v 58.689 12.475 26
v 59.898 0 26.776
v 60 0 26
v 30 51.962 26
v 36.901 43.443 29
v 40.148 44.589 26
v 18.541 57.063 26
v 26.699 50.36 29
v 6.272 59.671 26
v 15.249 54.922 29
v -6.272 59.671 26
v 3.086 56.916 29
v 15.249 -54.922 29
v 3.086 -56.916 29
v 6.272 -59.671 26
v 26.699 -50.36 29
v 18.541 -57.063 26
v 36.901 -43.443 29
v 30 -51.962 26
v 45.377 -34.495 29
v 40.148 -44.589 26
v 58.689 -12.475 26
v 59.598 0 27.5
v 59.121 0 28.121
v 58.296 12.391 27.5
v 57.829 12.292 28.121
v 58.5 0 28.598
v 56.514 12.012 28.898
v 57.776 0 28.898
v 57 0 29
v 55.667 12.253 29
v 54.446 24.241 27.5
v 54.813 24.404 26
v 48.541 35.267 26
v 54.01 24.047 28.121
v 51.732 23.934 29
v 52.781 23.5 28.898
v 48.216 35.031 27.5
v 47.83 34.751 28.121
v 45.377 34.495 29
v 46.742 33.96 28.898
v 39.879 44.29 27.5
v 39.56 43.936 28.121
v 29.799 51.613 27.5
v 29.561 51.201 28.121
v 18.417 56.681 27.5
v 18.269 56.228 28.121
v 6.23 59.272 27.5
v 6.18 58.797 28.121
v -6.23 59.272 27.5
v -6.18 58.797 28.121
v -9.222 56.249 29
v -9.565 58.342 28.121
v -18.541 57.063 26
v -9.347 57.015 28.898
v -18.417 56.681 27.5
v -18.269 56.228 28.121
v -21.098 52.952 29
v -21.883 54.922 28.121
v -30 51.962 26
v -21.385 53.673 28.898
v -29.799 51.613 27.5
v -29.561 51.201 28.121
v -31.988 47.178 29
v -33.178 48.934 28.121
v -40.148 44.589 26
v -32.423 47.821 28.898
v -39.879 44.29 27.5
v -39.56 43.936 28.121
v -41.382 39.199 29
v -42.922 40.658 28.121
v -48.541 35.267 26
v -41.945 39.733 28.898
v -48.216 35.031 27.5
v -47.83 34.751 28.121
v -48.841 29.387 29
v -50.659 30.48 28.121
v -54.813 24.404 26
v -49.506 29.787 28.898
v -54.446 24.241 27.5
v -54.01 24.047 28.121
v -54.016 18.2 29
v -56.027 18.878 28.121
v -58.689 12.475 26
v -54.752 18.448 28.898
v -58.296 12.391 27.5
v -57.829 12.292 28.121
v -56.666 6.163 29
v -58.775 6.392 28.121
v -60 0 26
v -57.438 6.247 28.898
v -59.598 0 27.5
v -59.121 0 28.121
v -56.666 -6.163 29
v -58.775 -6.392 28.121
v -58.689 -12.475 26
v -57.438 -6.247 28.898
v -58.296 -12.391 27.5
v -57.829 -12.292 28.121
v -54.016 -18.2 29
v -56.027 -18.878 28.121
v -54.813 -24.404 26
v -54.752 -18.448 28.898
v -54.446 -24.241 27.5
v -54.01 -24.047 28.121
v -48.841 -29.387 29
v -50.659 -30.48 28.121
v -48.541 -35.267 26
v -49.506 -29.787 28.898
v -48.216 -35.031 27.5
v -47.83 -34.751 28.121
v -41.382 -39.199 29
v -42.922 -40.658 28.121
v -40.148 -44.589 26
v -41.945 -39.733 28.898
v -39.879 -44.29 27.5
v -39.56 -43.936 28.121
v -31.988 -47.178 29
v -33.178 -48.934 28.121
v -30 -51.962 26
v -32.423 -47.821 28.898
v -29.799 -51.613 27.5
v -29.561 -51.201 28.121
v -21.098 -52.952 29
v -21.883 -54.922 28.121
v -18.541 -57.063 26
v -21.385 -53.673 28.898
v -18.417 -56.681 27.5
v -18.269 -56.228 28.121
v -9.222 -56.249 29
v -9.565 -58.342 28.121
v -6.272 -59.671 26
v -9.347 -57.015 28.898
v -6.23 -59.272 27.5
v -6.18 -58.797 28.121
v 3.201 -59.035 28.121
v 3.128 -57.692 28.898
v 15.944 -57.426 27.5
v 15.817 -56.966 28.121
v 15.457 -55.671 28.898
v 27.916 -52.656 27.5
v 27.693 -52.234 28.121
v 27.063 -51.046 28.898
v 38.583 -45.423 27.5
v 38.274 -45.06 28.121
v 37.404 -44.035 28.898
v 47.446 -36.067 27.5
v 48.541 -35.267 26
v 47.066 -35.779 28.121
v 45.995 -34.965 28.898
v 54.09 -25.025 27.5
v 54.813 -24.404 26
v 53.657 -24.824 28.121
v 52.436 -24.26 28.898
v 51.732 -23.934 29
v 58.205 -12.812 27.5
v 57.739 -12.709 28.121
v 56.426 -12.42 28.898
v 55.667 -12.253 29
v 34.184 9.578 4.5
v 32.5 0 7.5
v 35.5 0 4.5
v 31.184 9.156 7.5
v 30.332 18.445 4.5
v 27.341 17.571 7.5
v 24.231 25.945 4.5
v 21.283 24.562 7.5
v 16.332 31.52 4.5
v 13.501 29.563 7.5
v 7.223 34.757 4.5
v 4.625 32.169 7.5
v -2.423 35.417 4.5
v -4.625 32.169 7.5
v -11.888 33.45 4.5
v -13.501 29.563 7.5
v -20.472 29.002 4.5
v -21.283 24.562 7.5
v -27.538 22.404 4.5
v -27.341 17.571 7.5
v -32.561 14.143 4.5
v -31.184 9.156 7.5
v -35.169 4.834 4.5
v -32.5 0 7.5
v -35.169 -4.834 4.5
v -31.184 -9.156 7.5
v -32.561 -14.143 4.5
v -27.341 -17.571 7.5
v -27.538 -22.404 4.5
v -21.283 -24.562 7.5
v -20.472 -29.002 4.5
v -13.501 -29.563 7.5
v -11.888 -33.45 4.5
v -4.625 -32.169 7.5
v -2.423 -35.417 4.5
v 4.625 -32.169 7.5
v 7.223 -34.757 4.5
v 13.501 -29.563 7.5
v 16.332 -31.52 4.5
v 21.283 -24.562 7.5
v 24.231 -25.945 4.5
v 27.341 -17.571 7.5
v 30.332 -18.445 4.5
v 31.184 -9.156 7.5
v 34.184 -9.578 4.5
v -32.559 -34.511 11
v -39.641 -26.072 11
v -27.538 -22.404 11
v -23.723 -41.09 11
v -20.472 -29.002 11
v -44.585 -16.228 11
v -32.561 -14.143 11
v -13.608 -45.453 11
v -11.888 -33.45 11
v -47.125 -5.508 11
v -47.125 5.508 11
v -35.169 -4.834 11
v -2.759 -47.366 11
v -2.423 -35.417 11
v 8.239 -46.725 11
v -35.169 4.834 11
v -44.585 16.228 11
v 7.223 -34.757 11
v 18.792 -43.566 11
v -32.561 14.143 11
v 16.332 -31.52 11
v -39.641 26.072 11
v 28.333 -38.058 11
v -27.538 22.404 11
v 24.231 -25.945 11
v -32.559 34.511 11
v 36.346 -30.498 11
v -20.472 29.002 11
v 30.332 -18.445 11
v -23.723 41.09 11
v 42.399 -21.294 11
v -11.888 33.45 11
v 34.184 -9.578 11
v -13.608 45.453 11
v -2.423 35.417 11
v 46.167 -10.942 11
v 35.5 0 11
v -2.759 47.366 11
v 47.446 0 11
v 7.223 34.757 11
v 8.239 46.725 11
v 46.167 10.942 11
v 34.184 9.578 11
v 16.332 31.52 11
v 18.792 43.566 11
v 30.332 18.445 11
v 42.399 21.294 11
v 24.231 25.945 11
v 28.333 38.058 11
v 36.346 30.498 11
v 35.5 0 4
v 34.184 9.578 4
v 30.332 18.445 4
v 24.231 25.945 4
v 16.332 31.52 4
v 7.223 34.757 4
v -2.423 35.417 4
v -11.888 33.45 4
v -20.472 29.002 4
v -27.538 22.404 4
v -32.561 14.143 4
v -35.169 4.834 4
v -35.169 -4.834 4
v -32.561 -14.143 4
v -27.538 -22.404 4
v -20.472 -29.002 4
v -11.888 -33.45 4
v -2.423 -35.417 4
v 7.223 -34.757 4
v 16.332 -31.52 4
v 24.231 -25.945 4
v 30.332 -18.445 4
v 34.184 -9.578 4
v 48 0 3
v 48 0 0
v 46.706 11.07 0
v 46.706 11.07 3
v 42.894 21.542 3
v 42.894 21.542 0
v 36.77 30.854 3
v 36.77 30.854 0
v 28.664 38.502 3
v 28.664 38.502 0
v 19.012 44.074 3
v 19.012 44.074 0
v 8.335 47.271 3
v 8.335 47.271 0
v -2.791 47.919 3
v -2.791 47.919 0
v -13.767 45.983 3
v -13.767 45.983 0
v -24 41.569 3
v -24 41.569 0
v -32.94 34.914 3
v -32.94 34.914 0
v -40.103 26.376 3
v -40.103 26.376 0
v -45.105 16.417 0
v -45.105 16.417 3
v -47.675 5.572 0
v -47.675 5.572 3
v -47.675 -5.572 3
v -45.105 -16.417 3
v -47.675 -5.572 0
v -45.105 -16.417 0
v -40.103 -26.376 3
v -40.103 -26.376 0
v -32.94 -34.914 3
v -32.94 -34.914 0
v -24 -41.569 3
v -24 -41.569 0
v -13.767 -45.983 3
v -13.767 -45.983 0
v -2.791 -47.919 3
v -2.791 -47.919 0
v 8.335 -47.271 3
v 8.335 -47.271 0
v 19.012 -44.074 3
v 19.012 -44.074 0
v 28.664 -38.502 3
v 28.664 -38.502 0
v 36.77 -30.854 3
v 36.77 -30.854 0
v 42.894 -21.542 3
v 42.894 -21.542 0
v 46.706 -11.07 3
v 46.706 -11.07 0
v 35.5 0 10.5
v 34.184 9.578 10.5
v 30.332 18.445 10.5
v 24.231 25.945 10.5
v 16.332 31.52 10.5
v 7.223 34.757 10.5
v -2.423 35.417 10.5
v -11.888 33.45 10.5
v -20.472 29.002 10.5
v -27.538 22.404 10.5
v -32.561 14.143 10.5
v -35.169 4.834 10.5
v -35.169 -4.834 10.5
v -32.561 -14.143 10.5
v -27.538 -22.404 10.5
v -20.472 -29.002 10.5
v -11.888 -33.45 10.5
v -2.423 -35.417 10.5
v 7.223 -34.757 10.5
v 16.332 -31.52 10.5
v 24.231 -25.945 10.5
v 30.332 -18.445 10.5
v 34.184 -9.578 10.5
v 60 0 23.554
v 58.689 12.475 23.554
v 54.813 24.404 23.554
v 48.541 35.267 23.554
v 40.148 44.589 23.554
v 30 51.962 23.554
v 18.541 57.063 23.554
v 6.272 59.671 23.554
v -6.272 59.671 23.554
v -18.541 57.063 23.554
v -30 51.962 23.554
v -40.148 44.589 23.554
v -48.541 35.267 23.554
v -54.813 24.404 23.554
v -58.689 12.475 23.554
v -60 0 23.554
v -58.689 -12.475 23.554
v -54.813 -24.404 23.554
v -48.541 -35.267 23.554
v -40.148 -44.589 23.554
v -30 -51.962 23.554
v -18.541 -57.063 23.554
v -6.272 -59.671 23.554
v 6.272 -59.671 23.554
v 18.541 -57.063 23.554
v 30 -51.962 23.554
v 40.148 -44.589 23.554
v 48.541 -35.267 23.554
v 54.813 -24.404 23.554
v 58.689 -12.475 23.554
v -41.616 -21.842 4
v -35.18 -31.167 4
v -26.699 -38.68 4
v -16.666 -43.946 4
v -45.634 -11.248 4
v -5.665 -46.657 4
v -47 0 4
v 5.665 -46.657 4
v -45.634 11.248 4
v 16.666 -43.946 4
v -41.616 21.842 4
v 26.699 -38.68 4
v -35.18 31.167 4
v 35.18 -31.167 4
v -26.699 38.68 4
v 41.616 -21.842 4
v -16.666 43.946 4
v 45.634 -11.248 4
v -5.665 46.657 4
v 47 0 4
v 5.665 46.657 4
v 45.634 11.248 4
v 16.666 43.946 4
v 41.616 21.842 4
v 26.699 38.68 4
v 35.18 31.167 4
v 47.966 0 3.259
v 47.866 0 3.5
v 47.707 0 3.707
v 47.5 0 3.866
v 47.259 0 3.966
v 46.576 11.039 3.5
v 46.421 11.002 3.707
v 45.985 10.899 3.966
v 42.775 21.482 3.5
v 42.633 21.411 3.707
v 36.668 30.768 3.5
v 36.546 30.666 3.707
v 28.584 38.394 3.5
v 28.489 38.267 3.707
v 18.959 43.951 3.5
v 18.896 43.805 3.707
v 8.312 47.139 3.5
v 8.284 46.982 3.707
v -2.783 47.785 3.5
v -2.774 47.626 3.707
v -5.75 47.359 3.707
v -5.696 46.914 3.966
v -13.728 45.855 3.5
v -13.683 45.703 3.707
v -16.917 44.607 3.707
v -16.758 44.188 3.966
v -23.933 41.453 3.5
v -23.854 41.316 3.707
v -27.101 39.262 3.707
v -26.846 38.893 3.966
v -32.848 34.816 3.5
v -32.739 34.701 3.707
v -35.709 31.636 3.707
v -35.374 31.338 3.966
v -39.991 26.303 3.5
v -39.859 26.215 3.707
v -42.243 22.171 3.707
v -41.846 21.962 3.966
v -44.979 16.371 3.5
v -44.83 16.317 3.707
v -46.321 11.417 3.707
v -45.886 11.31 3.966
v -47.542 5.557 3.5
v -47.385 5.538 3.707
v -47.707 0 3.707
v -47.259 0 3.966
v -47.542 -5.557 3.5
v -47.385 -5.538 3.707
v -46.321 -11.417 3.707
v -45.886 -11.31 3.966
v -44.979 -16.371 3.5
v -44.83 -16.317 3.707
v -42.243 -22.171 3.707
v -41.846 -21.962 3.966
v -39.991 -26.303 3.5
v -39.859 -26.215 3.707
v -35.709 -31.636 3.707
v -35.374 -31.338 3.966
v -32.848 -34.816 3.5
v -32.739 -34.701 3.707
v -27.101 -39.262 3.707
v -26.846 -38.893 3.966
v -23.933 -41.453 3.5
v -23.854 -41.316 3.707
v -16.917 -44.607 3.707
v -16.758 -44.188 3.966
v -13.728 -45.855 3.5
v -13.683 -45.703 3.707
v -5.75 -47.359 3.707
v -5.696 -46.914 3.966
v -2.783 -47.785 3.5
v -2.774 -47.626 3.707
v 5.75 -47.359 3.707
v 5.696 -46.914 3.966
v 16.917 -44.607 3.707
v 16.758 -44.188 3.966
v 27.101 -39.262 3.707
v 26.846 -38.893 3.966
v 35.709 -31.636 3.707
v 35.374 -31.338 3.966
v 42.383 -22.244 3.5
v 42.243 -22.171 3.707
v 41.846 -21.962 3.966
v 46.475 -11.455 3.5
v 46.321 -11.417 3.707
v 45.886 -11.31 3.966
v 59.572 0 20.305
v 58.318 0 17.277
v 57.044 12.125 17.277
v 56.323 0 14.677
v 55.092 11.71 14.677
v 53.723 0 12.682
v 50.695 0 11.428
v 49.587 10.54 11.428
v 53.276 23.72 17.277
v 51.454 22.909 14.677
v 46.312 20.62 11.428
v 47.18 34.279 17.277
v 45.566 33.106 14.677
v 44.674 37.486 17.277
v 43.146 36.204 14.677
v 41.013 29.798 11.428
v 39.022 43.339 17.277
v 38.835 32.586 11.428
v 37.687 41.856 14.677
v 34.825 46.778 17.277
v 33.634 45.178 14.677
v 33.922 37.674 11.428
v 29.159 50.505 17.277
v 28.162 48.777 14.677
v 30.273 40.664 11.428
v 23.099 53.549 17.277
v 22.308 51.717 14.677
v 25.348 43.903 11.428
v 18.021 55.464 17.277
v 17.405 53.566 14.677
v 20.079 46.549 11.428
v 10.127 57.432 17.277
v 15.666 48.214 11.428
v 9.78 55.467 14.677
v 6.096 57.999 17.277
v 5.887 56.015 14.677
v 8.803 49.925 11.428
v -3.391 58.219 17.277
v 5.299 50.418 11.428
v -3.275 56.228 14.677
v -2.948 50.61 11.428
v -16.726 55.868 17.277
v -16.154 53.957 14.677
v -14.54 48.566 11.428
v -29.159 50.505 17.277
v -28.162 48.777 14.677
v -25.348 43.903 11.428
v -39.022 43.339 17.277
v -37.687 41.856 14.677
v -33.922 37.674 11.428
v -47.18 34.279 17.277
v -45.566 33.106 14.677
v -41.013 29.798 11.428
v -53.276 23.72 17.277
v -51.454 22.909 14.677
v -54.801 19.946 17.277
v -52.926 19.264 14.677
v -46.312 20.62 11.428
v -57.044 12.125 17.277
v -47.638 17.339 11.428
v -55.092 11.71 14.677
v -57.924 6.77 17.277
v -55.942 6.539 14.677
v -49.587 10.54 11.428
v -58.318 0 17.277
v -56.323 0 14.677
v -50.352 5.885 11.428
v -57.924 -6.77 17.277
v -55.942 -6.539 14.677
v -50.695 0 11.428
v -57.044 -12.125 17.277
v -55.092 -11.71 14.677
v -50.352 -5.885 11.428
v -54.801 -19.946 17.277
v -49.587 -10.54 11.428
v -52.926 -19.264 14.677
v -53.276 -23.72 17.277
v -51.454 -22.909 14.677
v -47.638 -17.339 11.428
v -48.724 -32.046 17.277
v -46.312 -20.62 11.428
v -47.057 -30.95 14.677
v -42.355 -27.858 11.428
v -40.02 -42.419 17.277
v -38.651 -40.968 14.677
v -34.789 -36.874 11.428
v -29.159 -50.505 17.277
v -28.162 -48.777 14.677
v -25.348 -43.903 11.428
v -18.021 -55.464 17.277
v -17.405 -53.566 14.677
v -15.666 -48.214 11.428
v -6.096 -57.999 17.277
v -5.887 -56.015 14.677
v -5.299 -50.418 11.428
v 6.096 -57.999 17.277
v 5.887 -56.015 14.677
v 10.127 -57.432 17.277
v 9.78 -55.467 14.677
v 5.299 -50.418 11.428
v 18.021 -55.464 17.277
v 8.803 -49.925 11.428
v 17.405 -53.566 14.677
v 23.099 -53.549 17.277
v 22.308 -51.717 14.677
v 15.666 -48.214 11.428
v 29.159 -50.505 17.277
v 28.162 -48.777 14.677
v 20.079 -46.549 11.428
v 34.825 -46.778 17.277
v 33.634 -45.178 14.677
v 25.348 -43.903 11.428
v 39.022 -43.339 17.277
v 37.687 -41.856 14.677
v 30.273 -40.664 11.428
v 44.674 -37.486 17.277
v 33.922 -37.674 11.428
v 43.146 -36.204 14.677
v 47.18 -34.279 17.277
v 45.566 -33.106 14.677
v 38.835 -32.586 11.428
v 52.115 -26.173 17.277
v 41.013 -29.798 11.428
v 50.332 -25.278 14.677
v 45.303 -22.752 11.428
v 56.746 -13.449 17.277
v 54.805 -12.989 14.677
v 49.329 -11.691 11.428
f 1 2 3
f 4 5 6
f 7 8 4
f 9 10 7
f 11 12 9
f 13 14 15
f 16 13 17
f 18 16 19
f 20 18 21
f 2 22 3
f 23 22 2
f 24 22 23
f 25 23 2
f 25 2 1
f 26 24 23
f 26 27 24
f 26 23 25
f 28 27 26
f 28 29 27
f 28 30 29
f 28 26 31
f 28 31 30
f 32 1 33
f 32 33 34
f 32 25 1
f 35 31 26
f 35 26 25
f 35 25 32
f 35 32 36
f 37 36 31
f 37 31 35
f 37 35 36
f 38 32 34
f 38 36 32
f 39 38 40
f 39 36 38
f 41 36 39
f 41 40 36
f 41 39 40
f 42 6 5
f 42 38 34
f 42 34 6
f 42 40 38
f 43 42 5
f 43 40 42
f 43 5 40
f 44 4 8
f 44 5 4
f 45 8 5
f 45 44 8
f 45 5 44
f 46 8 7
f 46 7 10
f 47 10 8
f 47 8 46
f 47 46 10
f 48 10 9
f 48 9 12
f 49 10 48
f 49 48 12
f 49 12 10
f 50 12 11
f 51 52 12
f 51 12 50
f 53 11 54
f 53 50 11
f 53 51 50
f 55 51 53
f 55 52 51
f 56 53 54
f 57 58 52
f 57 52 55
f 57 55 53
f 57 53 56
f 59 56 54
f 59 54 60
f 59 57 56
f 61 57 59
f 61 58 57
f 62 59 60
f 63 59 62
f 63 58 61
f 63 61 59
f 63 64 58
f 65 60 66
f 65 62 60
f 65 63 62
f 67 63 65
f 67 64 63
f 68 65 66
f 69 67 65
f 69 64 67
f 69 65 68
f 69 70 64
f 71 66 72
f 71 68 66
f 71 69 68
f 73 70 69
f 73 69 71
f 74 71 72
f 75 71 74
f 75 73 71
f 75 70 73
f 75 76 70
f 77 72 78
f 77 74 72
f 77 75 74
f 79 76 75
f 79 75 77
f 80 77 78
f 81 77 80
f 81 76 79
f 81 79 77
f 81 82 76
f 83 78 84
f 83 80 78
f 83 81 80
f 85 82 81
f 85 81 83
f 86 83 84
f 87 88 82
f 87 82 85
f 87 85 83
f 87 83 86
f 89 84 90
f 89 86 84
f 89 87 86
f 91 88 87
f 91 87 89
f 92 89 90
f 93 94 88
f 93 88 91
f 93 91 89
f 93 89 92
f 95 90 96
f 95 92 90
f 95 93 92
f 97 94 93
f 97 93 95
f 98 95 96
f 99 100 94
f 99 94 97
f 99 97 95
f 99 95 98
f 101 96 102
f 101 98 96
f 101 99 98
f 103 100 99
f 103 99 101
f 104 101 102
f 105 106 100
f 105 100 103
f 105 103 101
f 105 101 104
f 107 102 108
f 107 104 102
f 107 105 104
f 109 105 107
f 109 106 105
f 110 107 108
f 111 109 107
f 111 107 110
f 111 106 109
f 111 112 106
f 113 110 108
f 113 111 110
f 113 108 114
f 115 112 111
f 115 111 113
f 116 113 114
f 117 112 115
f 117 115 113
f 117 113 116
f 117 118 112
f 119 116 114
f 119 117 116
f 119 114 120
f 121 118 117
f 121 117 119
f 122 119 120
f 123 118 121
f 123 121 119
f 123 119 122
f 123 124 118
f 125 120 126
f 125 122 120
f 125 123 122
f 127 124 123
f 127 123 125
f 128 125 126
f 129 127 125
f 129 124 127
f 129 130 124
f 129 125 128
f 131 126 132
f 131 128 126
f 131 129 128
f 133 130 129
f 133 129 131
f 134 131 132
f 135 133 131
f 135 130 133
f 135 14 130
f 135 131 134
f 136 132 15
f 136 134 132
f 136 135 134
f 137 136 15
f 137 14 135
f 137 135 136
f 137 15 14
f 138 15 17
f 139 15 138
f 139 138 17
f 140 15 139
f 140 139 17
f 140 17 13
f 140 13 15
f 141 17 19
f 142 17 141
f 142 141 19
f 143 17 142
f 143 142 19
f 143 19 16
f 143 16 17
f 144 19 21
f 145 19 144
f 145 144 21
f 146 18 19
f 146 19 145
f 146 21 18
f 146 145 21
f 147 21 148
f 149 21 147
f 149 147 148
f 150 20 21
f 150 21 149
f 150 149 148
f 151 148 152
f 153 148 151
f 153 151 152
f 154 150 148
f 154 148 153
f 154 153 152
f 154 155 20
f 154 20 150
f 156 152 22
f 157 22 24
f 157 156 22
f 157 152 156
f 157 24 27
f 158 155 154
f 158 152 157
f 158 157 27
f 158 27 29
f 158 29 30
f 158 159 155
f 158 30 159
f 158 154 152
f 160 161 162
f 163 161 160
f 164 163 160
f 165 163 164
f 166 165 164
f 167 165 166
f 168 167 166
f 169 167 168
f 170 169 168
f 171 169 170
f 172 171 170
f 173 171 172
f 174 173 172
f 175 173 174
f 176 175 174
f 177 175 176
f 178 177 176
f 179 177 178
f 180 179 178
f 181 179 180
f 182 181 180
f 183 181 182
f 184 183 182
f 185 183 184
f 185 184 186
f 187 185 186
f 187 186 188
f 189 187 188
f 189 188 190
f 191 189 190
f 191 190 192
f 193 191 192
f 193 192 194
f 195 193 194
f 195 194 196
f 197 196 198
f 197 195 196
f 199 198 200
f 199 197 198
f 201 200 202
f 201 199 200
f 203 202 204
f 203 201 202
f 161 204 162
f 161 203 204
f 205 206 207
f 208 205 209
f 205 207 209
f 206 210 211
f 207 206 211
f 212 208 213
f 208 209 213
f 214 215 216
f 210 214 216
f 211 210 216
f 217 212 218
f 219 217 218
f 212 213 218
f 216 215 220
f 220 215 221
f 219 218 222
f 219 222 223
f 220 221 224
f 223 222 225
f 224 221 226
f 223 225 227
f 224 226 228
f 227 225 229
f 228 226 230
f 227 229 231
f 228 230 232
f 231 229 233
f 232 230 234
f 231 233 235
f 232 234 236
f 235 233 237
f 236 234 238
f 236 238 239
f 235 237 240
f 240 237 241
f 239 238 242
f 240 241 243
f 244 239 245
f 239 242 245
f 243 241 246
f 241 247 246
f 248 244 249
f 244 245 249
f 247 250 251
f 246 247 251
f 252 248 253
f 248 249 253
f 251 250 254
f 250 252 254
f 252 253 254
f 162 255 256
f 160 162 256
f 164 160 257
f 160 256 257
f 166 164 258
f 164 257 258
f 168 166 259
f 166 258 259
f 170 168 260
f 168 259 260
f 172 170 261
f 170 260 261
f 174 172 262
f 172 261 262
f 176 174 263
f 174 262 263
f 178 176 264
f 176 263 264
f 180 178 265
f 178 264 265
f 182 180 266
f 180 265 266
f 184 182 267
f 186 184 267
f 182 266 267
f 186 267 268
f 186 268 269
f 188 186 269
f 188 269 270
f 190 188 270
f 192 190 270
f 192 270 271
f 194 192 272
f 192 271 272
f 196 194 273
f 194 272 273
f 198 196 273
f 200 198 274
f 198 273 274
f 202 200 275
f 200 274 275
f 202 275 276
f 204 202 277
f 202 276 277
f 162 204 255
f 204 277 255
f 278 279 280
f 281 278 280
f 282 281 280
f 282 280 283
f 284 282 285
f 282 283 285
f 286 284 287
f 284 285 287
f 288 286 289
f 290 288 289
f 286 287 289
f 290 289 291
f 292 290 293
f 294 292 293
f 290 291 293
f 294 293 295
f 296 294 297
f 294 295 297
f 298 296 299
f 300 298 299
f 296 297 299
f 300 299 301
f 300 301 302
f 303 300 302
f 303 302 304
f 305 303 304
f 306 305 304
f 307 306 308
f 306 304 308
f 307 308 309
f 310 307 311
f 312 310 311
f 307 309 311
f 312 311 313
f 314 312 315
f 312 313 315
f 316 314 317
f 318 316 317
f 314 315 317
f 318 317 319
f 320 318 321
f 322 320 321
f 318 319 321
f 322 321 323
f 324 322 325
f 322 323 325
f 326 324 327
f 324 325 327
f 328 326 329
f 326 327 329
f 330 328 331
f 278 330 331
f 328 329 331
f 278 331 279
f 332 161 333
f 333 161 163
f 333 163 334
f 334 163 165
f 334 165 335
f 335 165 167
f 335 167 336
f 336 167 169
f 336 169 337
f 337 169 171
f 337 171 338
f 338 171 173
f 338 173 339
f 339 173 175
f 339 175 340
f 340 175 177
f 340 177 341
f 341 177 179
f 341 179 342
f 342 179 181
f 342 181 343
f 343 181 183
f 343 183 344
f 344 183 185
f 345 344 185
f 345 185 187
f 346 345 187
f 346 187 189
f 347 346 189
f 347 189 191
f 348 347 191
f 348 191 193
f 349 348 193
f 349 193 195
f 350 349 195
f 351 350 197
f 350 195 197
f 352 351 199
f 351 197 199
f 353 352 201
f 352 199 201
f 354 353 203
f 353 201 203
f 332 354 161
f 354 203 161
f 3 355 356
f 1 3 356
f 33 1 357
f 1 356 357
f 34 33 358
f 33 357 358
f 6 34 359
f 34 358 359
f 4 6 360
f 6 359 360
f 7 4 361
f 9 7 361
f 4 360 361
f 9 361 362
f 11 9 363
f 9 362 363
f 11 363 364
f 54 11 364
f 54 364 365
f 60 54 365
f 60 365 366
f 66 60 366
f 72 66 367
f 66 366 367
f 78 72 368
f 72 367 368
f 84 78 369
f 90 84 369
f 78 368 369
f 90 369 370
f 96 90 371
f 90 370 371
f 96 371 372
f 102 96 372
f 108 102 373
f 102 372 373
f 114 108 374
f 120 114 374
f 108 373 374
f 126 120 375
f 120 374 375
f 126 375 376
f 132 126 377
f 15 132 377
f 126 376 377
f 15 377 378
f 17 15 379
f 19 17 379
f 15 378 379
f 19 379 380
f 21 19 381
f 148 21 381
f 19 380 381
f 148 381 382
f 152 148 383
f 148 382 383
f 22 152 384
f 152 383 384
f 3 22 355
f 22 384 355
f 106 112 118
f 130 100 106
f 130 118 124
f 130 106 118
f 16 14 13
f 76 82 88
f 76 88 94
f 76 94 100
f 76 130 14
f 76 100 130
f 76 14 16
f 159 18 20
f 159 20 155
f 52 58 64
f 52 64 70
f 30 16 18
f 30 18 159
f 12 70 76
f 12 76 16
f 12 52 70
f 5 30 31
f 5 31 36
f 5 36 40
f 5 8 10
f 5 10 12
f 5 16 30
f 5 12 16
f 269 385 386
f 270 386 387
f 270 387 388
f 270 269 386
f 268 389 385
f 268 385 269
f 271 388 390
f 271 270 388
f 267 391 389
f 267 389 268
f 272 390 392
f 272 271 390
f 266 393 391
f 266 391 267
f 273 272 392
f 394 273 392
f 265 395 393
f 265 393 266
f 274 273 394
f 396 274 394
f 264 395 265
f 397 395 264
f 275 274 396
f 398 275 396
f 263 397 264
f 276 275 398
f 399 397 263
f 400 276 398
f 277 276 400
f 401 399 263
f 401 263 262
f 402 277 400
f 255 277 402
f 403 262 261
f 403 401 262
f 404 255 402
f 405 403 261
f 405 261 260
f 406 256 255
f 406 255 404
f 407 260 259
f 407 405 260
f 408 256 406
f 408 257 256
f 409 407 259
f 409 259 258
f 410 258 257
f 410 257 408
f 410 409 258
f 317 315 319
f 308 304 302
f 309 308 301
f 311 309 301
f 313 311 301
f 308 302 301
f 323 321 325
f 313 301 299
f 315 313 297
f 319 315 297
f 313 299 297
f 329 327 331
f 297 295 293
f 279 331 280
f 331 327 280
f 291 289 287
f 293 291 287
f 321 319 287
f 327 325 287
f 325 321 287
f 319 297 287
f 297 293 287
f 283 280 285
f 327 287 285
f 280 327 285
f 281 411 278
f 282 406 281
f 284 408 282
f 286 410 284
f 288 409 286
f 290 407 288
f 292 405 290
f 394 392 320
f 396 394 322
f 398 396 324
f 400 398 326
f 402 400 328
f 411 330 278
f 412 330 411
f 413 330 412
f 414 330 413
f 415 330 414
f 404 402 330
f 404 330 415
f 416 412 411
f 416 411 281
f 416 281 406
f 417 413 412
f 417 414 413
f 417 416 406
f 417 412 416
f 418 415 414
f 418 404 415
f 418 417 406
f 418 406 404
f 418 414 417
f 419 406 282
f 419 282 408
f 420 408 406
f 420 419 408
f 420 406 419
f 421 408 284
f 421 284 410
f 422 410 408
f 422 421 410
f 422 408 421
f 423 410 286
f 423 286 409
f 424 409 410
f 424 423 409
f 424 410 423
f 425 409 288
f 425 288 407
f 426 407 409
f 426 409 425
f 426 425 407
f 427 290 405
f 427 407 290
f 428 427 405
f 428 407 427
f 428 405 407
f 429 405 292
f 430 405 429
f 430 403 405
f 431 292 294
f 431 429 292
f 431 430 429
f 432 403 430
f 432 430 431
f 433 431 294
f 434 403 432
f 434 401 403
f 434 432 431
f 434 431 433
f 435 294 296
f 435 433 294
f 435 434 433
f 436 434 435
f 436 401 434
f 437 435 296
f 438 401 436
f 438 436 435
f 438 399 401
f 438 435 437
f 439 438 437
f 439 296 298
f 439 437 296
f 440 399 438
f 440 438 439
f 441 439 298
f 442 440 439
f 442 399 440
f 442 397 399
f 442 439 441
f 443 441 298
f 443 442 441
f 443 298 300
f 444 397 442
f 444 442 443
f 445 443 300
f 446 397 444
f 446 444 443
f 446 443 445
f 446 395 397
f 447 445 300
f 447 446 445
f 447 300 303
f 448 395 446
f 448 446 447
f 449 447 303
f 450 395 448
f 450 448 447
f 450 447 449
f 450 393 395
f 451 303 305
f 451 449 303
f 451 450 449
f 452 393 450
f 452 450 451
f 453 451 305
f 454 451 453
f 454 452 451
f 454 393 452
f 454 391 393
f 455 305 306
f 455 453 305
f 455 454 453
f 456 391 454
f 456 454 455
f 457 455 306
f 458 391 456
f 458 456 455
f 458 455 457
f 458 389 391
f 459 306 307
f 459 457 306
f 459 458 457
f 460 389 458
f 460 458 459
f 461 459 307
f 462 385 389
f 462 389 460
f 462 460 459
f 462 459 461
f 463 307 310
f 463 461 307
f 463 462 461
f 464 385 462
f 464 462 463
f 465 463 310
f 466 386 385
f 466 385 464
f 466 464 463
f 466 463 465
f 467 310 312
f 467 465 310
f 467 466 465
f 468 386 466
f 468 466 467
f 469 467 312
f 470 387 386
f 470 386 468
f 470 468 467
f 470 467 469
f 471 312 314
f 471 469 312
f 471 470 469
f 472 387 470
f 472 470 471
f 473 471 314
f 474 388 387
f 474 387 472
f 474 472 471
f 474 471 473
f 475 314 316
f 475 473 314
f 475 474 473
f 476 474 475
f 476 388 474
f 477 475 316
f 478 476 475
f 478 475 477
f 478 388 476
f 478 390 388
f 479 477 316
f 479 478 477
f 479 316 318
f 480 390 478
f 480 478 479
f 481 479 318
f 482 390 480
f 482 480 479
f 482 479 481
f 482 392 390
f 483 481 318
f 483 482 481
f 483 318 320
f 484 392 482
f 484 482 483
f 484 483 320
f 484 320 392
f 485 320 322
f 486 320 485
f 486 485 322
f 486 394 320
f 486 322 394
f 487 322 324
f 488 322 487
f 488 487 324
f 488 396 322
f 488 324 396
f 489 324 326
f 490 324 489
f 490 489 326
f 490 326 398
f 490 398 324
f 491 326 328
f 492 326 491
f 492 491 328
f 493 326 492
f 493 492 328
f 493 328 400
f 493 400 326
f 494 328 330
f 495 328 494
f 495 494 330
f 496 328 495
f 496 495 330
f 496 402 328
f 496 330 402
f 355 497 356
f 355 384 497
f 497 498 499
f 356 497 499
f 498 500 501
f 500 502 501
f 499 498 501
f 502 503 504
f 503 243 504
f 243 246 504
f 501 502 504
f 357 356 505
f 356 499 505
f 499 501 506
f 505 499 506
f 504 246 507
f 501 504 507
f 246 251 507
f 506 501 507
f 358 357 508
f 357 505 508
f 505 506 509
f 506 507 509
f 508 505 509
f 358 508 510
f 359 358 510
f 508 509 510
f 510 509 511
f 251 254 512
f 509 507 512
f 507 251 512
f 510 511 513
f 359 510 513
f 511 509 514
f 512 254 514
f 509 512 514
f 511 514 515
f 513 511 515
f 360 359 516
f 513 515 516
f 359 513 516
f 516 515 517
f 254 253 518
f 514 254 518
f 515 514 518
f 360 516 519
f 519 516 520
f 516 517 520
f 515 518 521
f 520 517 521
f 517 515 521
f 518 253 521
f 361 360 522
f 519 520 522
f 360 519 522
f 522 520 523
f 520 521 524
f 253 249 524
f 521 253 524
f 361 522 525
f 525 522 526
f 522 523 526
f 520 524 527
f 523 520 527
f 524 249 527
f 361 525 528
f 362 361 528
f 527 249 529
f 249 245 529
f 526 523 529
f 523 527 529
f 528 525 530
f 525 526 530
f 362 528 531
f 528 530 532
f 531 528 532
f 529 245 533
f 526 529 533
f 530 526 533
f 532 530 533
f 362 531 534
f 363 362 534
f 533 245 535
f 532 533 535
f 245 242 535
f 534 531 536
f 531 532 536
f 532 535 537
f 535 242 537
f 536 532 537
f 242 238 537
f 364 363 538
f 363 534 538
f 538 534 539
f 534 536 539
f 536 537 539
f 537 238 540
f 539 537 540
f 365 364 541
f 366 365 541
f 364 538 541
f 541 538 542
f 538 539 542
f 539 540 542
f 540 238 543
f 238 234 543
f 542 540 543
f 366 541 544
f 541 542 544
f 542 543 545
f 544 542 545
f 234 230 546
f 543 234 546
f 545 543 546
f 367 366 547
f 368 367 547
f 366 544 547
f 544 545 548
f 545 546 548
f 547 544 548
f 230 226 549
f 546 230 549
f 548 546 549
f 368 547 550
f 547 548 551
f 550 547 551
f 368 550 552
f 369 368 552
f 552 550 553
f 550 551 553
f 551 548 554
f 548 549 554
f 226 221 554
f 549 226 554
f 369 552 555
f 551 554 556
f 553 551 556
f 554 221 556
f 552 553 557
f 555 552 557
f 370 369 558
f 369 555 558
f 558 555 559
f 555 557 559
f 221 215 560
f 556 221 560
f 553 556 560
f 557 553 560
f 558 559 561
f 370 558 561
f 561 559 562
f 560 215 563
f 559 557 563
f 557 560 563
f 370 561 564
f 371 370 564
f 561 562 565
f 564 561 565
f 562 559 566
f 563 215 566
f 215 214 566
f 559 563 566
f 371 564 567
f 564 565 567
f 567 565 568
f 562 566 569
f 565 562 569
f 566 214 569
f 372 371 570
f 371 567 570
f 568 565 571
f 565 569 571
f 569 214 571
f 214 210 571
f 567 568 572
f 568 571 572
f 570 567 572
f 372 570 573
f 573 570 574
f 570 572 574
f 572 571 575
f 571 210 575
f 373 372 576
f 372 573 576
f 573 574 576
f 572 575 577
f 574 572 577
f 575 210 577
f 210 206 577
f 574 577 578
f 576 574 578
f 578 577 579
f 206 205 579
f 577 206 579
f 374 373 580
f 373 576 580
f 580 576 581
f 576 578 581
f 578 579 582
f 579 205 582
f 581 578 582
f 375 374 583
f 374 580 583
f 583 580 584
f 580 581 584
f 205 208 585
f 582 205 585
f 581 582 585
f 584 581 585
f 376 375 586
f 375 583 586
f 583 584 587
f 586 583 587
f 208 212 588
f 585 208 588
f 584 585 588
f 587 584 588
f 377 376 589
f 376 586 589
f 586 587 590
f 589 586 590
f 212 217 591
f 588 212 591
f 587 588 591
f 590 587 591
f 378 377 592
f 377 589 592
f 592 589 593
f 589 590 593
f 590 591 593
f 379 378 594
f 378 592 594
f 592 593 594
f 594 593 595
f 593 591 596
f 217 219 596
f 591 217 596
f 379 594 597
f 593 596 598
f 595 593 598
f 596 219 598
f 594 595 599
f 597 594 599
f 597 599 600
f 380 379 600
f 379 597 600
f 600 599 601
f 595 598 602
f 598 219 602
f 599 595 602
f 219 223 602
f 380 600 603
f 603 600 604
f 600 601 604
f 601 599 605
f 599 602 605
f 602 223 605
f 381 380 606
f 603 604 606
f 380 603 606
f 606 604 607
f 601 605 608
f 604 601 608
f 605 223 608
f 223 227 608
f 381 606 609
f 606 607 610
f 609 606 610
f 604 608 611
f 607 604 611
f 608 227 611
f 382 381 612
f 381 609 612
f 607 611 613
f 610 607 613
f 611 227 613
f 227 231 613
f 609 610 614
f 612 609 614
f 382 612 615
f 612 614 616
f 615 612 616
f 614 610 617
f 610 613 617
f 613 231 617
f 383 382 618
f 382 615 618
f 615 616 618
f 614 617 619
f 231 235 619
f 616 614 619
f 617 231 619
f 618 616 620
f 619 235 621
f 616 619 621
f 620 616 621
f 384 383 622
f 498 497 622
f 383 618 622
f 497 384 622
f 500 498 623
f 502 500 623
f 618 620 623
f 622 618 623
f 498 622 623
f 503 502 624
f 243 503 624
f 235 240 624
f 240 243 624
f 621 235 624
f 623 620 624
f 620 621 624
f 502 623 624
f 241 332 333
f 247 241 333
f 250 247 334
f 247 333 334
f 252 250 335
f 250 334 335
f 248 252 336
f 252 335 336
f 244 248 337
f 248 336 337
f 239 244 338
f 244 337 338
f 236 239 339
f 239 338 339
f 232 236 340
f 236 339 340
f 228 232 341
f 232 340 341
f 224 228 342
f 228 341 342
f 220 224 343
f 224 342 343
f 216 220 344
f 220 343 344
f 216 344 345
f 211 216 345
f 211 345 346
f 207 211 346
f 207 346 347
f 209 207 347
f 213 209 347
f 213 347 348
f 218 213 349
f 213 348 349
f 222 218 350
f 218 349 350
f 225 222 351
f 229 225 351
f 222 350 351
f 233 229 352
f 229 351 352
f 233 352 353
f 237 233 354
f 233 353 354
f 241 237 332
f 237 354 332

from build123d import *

# Parameters (mm, degrees)
F0_R      = 48
F1_DEPTH  = 4
F2_R      = 1
F3_R      = 35.5
F4_DEPTH  = 3.5
F5_SIZE   = 3
F6_R      = 35.5
F6_R_2    = 32.5
F7_DEPTH  = 3.5
F8_SIZE   = 2.99999
F9_R      = 60
F9_R_2    = 47.0001739343
F9_R_3    = 35.5
F10_DEPTH = 18
F11_R     = 12.5539105243
F12_R     = 3


# Not quite as in the source:
# - a fillet or chamfer is up to 0.001 mm smaller than in the source, because OpenCascade refuses the exact size


with BuildPart() as f1:
    # F0 (on Top) → F1 (new body)
    with BuildSketch(Plane.XY):
        Circle(F0_R)
    extrude(amount=F1_DEPTH)

    # F2
    f2_edges = [f1.edges().sort_by_distance(p)[0] for p in [
        (-48, 0, 4),
    ]]
    fillet(f2_edges, radius=F2_R)

    # F3 (on face) → F4 (join)
    with BuildSketch(Plane.XY.offset(4)):
        Circle(F3_R)
    extrude(amount=F4_DEPTH)

    # F5
    f5_edges = [f1.edges().sort_by_distance(p)[0] for p in [
        (-35.5, 0, 7.5),
    ]]
    chamfer(f5_edges, length=F5_SIZE)

    # F6 (on face) → F7 (join)
    with BuildSketch(Plane.XY.offset(7.5)):
        Circle(F6_R)
        Circle(F6_R_2, mode=Mode.SUBTRACT)
        Circle(F6_R_2)
    extrude(amount=F7_DEPTH)

    # F8 (size 3 in the source; OpenCascade refuses exactly that, so slightly less here)
    f8_edges = [f1.edges().sort_by_distance(p)[0] for p in [
        (-35.5, 0, 7.5),
    ]]
    chamfer(f8_edges, length=F8_SIZE)

    # F9 (on face) → F10 (join)
    with BuildSketch(Plane.XY.offset(11)):
        Circle(F9_R)
        Circle(F9_R_2, mode=Mode.SUBTRACT)
        Circle(F9_R_2)
        Circle(F9_R_3, mode=Mode.SUBTRACT)
        Circle(F9_R_3)
    extrude(amount=F10_DEPTH)

    # F11
    f11_edges = [f1.edges().sort_by_distance(p)[0] for p in [
        (-60, 0, 11),
    ]]
    fillet(f11_edges, radius=F11_R)

    # F12
    f12_edges = [f1.edges().sort_by_distance(p)[0] for p in [
        (-60, 0, 29),
    ]]
    fillet(f12_edges, radius=F12_R)


solid = f1.part
